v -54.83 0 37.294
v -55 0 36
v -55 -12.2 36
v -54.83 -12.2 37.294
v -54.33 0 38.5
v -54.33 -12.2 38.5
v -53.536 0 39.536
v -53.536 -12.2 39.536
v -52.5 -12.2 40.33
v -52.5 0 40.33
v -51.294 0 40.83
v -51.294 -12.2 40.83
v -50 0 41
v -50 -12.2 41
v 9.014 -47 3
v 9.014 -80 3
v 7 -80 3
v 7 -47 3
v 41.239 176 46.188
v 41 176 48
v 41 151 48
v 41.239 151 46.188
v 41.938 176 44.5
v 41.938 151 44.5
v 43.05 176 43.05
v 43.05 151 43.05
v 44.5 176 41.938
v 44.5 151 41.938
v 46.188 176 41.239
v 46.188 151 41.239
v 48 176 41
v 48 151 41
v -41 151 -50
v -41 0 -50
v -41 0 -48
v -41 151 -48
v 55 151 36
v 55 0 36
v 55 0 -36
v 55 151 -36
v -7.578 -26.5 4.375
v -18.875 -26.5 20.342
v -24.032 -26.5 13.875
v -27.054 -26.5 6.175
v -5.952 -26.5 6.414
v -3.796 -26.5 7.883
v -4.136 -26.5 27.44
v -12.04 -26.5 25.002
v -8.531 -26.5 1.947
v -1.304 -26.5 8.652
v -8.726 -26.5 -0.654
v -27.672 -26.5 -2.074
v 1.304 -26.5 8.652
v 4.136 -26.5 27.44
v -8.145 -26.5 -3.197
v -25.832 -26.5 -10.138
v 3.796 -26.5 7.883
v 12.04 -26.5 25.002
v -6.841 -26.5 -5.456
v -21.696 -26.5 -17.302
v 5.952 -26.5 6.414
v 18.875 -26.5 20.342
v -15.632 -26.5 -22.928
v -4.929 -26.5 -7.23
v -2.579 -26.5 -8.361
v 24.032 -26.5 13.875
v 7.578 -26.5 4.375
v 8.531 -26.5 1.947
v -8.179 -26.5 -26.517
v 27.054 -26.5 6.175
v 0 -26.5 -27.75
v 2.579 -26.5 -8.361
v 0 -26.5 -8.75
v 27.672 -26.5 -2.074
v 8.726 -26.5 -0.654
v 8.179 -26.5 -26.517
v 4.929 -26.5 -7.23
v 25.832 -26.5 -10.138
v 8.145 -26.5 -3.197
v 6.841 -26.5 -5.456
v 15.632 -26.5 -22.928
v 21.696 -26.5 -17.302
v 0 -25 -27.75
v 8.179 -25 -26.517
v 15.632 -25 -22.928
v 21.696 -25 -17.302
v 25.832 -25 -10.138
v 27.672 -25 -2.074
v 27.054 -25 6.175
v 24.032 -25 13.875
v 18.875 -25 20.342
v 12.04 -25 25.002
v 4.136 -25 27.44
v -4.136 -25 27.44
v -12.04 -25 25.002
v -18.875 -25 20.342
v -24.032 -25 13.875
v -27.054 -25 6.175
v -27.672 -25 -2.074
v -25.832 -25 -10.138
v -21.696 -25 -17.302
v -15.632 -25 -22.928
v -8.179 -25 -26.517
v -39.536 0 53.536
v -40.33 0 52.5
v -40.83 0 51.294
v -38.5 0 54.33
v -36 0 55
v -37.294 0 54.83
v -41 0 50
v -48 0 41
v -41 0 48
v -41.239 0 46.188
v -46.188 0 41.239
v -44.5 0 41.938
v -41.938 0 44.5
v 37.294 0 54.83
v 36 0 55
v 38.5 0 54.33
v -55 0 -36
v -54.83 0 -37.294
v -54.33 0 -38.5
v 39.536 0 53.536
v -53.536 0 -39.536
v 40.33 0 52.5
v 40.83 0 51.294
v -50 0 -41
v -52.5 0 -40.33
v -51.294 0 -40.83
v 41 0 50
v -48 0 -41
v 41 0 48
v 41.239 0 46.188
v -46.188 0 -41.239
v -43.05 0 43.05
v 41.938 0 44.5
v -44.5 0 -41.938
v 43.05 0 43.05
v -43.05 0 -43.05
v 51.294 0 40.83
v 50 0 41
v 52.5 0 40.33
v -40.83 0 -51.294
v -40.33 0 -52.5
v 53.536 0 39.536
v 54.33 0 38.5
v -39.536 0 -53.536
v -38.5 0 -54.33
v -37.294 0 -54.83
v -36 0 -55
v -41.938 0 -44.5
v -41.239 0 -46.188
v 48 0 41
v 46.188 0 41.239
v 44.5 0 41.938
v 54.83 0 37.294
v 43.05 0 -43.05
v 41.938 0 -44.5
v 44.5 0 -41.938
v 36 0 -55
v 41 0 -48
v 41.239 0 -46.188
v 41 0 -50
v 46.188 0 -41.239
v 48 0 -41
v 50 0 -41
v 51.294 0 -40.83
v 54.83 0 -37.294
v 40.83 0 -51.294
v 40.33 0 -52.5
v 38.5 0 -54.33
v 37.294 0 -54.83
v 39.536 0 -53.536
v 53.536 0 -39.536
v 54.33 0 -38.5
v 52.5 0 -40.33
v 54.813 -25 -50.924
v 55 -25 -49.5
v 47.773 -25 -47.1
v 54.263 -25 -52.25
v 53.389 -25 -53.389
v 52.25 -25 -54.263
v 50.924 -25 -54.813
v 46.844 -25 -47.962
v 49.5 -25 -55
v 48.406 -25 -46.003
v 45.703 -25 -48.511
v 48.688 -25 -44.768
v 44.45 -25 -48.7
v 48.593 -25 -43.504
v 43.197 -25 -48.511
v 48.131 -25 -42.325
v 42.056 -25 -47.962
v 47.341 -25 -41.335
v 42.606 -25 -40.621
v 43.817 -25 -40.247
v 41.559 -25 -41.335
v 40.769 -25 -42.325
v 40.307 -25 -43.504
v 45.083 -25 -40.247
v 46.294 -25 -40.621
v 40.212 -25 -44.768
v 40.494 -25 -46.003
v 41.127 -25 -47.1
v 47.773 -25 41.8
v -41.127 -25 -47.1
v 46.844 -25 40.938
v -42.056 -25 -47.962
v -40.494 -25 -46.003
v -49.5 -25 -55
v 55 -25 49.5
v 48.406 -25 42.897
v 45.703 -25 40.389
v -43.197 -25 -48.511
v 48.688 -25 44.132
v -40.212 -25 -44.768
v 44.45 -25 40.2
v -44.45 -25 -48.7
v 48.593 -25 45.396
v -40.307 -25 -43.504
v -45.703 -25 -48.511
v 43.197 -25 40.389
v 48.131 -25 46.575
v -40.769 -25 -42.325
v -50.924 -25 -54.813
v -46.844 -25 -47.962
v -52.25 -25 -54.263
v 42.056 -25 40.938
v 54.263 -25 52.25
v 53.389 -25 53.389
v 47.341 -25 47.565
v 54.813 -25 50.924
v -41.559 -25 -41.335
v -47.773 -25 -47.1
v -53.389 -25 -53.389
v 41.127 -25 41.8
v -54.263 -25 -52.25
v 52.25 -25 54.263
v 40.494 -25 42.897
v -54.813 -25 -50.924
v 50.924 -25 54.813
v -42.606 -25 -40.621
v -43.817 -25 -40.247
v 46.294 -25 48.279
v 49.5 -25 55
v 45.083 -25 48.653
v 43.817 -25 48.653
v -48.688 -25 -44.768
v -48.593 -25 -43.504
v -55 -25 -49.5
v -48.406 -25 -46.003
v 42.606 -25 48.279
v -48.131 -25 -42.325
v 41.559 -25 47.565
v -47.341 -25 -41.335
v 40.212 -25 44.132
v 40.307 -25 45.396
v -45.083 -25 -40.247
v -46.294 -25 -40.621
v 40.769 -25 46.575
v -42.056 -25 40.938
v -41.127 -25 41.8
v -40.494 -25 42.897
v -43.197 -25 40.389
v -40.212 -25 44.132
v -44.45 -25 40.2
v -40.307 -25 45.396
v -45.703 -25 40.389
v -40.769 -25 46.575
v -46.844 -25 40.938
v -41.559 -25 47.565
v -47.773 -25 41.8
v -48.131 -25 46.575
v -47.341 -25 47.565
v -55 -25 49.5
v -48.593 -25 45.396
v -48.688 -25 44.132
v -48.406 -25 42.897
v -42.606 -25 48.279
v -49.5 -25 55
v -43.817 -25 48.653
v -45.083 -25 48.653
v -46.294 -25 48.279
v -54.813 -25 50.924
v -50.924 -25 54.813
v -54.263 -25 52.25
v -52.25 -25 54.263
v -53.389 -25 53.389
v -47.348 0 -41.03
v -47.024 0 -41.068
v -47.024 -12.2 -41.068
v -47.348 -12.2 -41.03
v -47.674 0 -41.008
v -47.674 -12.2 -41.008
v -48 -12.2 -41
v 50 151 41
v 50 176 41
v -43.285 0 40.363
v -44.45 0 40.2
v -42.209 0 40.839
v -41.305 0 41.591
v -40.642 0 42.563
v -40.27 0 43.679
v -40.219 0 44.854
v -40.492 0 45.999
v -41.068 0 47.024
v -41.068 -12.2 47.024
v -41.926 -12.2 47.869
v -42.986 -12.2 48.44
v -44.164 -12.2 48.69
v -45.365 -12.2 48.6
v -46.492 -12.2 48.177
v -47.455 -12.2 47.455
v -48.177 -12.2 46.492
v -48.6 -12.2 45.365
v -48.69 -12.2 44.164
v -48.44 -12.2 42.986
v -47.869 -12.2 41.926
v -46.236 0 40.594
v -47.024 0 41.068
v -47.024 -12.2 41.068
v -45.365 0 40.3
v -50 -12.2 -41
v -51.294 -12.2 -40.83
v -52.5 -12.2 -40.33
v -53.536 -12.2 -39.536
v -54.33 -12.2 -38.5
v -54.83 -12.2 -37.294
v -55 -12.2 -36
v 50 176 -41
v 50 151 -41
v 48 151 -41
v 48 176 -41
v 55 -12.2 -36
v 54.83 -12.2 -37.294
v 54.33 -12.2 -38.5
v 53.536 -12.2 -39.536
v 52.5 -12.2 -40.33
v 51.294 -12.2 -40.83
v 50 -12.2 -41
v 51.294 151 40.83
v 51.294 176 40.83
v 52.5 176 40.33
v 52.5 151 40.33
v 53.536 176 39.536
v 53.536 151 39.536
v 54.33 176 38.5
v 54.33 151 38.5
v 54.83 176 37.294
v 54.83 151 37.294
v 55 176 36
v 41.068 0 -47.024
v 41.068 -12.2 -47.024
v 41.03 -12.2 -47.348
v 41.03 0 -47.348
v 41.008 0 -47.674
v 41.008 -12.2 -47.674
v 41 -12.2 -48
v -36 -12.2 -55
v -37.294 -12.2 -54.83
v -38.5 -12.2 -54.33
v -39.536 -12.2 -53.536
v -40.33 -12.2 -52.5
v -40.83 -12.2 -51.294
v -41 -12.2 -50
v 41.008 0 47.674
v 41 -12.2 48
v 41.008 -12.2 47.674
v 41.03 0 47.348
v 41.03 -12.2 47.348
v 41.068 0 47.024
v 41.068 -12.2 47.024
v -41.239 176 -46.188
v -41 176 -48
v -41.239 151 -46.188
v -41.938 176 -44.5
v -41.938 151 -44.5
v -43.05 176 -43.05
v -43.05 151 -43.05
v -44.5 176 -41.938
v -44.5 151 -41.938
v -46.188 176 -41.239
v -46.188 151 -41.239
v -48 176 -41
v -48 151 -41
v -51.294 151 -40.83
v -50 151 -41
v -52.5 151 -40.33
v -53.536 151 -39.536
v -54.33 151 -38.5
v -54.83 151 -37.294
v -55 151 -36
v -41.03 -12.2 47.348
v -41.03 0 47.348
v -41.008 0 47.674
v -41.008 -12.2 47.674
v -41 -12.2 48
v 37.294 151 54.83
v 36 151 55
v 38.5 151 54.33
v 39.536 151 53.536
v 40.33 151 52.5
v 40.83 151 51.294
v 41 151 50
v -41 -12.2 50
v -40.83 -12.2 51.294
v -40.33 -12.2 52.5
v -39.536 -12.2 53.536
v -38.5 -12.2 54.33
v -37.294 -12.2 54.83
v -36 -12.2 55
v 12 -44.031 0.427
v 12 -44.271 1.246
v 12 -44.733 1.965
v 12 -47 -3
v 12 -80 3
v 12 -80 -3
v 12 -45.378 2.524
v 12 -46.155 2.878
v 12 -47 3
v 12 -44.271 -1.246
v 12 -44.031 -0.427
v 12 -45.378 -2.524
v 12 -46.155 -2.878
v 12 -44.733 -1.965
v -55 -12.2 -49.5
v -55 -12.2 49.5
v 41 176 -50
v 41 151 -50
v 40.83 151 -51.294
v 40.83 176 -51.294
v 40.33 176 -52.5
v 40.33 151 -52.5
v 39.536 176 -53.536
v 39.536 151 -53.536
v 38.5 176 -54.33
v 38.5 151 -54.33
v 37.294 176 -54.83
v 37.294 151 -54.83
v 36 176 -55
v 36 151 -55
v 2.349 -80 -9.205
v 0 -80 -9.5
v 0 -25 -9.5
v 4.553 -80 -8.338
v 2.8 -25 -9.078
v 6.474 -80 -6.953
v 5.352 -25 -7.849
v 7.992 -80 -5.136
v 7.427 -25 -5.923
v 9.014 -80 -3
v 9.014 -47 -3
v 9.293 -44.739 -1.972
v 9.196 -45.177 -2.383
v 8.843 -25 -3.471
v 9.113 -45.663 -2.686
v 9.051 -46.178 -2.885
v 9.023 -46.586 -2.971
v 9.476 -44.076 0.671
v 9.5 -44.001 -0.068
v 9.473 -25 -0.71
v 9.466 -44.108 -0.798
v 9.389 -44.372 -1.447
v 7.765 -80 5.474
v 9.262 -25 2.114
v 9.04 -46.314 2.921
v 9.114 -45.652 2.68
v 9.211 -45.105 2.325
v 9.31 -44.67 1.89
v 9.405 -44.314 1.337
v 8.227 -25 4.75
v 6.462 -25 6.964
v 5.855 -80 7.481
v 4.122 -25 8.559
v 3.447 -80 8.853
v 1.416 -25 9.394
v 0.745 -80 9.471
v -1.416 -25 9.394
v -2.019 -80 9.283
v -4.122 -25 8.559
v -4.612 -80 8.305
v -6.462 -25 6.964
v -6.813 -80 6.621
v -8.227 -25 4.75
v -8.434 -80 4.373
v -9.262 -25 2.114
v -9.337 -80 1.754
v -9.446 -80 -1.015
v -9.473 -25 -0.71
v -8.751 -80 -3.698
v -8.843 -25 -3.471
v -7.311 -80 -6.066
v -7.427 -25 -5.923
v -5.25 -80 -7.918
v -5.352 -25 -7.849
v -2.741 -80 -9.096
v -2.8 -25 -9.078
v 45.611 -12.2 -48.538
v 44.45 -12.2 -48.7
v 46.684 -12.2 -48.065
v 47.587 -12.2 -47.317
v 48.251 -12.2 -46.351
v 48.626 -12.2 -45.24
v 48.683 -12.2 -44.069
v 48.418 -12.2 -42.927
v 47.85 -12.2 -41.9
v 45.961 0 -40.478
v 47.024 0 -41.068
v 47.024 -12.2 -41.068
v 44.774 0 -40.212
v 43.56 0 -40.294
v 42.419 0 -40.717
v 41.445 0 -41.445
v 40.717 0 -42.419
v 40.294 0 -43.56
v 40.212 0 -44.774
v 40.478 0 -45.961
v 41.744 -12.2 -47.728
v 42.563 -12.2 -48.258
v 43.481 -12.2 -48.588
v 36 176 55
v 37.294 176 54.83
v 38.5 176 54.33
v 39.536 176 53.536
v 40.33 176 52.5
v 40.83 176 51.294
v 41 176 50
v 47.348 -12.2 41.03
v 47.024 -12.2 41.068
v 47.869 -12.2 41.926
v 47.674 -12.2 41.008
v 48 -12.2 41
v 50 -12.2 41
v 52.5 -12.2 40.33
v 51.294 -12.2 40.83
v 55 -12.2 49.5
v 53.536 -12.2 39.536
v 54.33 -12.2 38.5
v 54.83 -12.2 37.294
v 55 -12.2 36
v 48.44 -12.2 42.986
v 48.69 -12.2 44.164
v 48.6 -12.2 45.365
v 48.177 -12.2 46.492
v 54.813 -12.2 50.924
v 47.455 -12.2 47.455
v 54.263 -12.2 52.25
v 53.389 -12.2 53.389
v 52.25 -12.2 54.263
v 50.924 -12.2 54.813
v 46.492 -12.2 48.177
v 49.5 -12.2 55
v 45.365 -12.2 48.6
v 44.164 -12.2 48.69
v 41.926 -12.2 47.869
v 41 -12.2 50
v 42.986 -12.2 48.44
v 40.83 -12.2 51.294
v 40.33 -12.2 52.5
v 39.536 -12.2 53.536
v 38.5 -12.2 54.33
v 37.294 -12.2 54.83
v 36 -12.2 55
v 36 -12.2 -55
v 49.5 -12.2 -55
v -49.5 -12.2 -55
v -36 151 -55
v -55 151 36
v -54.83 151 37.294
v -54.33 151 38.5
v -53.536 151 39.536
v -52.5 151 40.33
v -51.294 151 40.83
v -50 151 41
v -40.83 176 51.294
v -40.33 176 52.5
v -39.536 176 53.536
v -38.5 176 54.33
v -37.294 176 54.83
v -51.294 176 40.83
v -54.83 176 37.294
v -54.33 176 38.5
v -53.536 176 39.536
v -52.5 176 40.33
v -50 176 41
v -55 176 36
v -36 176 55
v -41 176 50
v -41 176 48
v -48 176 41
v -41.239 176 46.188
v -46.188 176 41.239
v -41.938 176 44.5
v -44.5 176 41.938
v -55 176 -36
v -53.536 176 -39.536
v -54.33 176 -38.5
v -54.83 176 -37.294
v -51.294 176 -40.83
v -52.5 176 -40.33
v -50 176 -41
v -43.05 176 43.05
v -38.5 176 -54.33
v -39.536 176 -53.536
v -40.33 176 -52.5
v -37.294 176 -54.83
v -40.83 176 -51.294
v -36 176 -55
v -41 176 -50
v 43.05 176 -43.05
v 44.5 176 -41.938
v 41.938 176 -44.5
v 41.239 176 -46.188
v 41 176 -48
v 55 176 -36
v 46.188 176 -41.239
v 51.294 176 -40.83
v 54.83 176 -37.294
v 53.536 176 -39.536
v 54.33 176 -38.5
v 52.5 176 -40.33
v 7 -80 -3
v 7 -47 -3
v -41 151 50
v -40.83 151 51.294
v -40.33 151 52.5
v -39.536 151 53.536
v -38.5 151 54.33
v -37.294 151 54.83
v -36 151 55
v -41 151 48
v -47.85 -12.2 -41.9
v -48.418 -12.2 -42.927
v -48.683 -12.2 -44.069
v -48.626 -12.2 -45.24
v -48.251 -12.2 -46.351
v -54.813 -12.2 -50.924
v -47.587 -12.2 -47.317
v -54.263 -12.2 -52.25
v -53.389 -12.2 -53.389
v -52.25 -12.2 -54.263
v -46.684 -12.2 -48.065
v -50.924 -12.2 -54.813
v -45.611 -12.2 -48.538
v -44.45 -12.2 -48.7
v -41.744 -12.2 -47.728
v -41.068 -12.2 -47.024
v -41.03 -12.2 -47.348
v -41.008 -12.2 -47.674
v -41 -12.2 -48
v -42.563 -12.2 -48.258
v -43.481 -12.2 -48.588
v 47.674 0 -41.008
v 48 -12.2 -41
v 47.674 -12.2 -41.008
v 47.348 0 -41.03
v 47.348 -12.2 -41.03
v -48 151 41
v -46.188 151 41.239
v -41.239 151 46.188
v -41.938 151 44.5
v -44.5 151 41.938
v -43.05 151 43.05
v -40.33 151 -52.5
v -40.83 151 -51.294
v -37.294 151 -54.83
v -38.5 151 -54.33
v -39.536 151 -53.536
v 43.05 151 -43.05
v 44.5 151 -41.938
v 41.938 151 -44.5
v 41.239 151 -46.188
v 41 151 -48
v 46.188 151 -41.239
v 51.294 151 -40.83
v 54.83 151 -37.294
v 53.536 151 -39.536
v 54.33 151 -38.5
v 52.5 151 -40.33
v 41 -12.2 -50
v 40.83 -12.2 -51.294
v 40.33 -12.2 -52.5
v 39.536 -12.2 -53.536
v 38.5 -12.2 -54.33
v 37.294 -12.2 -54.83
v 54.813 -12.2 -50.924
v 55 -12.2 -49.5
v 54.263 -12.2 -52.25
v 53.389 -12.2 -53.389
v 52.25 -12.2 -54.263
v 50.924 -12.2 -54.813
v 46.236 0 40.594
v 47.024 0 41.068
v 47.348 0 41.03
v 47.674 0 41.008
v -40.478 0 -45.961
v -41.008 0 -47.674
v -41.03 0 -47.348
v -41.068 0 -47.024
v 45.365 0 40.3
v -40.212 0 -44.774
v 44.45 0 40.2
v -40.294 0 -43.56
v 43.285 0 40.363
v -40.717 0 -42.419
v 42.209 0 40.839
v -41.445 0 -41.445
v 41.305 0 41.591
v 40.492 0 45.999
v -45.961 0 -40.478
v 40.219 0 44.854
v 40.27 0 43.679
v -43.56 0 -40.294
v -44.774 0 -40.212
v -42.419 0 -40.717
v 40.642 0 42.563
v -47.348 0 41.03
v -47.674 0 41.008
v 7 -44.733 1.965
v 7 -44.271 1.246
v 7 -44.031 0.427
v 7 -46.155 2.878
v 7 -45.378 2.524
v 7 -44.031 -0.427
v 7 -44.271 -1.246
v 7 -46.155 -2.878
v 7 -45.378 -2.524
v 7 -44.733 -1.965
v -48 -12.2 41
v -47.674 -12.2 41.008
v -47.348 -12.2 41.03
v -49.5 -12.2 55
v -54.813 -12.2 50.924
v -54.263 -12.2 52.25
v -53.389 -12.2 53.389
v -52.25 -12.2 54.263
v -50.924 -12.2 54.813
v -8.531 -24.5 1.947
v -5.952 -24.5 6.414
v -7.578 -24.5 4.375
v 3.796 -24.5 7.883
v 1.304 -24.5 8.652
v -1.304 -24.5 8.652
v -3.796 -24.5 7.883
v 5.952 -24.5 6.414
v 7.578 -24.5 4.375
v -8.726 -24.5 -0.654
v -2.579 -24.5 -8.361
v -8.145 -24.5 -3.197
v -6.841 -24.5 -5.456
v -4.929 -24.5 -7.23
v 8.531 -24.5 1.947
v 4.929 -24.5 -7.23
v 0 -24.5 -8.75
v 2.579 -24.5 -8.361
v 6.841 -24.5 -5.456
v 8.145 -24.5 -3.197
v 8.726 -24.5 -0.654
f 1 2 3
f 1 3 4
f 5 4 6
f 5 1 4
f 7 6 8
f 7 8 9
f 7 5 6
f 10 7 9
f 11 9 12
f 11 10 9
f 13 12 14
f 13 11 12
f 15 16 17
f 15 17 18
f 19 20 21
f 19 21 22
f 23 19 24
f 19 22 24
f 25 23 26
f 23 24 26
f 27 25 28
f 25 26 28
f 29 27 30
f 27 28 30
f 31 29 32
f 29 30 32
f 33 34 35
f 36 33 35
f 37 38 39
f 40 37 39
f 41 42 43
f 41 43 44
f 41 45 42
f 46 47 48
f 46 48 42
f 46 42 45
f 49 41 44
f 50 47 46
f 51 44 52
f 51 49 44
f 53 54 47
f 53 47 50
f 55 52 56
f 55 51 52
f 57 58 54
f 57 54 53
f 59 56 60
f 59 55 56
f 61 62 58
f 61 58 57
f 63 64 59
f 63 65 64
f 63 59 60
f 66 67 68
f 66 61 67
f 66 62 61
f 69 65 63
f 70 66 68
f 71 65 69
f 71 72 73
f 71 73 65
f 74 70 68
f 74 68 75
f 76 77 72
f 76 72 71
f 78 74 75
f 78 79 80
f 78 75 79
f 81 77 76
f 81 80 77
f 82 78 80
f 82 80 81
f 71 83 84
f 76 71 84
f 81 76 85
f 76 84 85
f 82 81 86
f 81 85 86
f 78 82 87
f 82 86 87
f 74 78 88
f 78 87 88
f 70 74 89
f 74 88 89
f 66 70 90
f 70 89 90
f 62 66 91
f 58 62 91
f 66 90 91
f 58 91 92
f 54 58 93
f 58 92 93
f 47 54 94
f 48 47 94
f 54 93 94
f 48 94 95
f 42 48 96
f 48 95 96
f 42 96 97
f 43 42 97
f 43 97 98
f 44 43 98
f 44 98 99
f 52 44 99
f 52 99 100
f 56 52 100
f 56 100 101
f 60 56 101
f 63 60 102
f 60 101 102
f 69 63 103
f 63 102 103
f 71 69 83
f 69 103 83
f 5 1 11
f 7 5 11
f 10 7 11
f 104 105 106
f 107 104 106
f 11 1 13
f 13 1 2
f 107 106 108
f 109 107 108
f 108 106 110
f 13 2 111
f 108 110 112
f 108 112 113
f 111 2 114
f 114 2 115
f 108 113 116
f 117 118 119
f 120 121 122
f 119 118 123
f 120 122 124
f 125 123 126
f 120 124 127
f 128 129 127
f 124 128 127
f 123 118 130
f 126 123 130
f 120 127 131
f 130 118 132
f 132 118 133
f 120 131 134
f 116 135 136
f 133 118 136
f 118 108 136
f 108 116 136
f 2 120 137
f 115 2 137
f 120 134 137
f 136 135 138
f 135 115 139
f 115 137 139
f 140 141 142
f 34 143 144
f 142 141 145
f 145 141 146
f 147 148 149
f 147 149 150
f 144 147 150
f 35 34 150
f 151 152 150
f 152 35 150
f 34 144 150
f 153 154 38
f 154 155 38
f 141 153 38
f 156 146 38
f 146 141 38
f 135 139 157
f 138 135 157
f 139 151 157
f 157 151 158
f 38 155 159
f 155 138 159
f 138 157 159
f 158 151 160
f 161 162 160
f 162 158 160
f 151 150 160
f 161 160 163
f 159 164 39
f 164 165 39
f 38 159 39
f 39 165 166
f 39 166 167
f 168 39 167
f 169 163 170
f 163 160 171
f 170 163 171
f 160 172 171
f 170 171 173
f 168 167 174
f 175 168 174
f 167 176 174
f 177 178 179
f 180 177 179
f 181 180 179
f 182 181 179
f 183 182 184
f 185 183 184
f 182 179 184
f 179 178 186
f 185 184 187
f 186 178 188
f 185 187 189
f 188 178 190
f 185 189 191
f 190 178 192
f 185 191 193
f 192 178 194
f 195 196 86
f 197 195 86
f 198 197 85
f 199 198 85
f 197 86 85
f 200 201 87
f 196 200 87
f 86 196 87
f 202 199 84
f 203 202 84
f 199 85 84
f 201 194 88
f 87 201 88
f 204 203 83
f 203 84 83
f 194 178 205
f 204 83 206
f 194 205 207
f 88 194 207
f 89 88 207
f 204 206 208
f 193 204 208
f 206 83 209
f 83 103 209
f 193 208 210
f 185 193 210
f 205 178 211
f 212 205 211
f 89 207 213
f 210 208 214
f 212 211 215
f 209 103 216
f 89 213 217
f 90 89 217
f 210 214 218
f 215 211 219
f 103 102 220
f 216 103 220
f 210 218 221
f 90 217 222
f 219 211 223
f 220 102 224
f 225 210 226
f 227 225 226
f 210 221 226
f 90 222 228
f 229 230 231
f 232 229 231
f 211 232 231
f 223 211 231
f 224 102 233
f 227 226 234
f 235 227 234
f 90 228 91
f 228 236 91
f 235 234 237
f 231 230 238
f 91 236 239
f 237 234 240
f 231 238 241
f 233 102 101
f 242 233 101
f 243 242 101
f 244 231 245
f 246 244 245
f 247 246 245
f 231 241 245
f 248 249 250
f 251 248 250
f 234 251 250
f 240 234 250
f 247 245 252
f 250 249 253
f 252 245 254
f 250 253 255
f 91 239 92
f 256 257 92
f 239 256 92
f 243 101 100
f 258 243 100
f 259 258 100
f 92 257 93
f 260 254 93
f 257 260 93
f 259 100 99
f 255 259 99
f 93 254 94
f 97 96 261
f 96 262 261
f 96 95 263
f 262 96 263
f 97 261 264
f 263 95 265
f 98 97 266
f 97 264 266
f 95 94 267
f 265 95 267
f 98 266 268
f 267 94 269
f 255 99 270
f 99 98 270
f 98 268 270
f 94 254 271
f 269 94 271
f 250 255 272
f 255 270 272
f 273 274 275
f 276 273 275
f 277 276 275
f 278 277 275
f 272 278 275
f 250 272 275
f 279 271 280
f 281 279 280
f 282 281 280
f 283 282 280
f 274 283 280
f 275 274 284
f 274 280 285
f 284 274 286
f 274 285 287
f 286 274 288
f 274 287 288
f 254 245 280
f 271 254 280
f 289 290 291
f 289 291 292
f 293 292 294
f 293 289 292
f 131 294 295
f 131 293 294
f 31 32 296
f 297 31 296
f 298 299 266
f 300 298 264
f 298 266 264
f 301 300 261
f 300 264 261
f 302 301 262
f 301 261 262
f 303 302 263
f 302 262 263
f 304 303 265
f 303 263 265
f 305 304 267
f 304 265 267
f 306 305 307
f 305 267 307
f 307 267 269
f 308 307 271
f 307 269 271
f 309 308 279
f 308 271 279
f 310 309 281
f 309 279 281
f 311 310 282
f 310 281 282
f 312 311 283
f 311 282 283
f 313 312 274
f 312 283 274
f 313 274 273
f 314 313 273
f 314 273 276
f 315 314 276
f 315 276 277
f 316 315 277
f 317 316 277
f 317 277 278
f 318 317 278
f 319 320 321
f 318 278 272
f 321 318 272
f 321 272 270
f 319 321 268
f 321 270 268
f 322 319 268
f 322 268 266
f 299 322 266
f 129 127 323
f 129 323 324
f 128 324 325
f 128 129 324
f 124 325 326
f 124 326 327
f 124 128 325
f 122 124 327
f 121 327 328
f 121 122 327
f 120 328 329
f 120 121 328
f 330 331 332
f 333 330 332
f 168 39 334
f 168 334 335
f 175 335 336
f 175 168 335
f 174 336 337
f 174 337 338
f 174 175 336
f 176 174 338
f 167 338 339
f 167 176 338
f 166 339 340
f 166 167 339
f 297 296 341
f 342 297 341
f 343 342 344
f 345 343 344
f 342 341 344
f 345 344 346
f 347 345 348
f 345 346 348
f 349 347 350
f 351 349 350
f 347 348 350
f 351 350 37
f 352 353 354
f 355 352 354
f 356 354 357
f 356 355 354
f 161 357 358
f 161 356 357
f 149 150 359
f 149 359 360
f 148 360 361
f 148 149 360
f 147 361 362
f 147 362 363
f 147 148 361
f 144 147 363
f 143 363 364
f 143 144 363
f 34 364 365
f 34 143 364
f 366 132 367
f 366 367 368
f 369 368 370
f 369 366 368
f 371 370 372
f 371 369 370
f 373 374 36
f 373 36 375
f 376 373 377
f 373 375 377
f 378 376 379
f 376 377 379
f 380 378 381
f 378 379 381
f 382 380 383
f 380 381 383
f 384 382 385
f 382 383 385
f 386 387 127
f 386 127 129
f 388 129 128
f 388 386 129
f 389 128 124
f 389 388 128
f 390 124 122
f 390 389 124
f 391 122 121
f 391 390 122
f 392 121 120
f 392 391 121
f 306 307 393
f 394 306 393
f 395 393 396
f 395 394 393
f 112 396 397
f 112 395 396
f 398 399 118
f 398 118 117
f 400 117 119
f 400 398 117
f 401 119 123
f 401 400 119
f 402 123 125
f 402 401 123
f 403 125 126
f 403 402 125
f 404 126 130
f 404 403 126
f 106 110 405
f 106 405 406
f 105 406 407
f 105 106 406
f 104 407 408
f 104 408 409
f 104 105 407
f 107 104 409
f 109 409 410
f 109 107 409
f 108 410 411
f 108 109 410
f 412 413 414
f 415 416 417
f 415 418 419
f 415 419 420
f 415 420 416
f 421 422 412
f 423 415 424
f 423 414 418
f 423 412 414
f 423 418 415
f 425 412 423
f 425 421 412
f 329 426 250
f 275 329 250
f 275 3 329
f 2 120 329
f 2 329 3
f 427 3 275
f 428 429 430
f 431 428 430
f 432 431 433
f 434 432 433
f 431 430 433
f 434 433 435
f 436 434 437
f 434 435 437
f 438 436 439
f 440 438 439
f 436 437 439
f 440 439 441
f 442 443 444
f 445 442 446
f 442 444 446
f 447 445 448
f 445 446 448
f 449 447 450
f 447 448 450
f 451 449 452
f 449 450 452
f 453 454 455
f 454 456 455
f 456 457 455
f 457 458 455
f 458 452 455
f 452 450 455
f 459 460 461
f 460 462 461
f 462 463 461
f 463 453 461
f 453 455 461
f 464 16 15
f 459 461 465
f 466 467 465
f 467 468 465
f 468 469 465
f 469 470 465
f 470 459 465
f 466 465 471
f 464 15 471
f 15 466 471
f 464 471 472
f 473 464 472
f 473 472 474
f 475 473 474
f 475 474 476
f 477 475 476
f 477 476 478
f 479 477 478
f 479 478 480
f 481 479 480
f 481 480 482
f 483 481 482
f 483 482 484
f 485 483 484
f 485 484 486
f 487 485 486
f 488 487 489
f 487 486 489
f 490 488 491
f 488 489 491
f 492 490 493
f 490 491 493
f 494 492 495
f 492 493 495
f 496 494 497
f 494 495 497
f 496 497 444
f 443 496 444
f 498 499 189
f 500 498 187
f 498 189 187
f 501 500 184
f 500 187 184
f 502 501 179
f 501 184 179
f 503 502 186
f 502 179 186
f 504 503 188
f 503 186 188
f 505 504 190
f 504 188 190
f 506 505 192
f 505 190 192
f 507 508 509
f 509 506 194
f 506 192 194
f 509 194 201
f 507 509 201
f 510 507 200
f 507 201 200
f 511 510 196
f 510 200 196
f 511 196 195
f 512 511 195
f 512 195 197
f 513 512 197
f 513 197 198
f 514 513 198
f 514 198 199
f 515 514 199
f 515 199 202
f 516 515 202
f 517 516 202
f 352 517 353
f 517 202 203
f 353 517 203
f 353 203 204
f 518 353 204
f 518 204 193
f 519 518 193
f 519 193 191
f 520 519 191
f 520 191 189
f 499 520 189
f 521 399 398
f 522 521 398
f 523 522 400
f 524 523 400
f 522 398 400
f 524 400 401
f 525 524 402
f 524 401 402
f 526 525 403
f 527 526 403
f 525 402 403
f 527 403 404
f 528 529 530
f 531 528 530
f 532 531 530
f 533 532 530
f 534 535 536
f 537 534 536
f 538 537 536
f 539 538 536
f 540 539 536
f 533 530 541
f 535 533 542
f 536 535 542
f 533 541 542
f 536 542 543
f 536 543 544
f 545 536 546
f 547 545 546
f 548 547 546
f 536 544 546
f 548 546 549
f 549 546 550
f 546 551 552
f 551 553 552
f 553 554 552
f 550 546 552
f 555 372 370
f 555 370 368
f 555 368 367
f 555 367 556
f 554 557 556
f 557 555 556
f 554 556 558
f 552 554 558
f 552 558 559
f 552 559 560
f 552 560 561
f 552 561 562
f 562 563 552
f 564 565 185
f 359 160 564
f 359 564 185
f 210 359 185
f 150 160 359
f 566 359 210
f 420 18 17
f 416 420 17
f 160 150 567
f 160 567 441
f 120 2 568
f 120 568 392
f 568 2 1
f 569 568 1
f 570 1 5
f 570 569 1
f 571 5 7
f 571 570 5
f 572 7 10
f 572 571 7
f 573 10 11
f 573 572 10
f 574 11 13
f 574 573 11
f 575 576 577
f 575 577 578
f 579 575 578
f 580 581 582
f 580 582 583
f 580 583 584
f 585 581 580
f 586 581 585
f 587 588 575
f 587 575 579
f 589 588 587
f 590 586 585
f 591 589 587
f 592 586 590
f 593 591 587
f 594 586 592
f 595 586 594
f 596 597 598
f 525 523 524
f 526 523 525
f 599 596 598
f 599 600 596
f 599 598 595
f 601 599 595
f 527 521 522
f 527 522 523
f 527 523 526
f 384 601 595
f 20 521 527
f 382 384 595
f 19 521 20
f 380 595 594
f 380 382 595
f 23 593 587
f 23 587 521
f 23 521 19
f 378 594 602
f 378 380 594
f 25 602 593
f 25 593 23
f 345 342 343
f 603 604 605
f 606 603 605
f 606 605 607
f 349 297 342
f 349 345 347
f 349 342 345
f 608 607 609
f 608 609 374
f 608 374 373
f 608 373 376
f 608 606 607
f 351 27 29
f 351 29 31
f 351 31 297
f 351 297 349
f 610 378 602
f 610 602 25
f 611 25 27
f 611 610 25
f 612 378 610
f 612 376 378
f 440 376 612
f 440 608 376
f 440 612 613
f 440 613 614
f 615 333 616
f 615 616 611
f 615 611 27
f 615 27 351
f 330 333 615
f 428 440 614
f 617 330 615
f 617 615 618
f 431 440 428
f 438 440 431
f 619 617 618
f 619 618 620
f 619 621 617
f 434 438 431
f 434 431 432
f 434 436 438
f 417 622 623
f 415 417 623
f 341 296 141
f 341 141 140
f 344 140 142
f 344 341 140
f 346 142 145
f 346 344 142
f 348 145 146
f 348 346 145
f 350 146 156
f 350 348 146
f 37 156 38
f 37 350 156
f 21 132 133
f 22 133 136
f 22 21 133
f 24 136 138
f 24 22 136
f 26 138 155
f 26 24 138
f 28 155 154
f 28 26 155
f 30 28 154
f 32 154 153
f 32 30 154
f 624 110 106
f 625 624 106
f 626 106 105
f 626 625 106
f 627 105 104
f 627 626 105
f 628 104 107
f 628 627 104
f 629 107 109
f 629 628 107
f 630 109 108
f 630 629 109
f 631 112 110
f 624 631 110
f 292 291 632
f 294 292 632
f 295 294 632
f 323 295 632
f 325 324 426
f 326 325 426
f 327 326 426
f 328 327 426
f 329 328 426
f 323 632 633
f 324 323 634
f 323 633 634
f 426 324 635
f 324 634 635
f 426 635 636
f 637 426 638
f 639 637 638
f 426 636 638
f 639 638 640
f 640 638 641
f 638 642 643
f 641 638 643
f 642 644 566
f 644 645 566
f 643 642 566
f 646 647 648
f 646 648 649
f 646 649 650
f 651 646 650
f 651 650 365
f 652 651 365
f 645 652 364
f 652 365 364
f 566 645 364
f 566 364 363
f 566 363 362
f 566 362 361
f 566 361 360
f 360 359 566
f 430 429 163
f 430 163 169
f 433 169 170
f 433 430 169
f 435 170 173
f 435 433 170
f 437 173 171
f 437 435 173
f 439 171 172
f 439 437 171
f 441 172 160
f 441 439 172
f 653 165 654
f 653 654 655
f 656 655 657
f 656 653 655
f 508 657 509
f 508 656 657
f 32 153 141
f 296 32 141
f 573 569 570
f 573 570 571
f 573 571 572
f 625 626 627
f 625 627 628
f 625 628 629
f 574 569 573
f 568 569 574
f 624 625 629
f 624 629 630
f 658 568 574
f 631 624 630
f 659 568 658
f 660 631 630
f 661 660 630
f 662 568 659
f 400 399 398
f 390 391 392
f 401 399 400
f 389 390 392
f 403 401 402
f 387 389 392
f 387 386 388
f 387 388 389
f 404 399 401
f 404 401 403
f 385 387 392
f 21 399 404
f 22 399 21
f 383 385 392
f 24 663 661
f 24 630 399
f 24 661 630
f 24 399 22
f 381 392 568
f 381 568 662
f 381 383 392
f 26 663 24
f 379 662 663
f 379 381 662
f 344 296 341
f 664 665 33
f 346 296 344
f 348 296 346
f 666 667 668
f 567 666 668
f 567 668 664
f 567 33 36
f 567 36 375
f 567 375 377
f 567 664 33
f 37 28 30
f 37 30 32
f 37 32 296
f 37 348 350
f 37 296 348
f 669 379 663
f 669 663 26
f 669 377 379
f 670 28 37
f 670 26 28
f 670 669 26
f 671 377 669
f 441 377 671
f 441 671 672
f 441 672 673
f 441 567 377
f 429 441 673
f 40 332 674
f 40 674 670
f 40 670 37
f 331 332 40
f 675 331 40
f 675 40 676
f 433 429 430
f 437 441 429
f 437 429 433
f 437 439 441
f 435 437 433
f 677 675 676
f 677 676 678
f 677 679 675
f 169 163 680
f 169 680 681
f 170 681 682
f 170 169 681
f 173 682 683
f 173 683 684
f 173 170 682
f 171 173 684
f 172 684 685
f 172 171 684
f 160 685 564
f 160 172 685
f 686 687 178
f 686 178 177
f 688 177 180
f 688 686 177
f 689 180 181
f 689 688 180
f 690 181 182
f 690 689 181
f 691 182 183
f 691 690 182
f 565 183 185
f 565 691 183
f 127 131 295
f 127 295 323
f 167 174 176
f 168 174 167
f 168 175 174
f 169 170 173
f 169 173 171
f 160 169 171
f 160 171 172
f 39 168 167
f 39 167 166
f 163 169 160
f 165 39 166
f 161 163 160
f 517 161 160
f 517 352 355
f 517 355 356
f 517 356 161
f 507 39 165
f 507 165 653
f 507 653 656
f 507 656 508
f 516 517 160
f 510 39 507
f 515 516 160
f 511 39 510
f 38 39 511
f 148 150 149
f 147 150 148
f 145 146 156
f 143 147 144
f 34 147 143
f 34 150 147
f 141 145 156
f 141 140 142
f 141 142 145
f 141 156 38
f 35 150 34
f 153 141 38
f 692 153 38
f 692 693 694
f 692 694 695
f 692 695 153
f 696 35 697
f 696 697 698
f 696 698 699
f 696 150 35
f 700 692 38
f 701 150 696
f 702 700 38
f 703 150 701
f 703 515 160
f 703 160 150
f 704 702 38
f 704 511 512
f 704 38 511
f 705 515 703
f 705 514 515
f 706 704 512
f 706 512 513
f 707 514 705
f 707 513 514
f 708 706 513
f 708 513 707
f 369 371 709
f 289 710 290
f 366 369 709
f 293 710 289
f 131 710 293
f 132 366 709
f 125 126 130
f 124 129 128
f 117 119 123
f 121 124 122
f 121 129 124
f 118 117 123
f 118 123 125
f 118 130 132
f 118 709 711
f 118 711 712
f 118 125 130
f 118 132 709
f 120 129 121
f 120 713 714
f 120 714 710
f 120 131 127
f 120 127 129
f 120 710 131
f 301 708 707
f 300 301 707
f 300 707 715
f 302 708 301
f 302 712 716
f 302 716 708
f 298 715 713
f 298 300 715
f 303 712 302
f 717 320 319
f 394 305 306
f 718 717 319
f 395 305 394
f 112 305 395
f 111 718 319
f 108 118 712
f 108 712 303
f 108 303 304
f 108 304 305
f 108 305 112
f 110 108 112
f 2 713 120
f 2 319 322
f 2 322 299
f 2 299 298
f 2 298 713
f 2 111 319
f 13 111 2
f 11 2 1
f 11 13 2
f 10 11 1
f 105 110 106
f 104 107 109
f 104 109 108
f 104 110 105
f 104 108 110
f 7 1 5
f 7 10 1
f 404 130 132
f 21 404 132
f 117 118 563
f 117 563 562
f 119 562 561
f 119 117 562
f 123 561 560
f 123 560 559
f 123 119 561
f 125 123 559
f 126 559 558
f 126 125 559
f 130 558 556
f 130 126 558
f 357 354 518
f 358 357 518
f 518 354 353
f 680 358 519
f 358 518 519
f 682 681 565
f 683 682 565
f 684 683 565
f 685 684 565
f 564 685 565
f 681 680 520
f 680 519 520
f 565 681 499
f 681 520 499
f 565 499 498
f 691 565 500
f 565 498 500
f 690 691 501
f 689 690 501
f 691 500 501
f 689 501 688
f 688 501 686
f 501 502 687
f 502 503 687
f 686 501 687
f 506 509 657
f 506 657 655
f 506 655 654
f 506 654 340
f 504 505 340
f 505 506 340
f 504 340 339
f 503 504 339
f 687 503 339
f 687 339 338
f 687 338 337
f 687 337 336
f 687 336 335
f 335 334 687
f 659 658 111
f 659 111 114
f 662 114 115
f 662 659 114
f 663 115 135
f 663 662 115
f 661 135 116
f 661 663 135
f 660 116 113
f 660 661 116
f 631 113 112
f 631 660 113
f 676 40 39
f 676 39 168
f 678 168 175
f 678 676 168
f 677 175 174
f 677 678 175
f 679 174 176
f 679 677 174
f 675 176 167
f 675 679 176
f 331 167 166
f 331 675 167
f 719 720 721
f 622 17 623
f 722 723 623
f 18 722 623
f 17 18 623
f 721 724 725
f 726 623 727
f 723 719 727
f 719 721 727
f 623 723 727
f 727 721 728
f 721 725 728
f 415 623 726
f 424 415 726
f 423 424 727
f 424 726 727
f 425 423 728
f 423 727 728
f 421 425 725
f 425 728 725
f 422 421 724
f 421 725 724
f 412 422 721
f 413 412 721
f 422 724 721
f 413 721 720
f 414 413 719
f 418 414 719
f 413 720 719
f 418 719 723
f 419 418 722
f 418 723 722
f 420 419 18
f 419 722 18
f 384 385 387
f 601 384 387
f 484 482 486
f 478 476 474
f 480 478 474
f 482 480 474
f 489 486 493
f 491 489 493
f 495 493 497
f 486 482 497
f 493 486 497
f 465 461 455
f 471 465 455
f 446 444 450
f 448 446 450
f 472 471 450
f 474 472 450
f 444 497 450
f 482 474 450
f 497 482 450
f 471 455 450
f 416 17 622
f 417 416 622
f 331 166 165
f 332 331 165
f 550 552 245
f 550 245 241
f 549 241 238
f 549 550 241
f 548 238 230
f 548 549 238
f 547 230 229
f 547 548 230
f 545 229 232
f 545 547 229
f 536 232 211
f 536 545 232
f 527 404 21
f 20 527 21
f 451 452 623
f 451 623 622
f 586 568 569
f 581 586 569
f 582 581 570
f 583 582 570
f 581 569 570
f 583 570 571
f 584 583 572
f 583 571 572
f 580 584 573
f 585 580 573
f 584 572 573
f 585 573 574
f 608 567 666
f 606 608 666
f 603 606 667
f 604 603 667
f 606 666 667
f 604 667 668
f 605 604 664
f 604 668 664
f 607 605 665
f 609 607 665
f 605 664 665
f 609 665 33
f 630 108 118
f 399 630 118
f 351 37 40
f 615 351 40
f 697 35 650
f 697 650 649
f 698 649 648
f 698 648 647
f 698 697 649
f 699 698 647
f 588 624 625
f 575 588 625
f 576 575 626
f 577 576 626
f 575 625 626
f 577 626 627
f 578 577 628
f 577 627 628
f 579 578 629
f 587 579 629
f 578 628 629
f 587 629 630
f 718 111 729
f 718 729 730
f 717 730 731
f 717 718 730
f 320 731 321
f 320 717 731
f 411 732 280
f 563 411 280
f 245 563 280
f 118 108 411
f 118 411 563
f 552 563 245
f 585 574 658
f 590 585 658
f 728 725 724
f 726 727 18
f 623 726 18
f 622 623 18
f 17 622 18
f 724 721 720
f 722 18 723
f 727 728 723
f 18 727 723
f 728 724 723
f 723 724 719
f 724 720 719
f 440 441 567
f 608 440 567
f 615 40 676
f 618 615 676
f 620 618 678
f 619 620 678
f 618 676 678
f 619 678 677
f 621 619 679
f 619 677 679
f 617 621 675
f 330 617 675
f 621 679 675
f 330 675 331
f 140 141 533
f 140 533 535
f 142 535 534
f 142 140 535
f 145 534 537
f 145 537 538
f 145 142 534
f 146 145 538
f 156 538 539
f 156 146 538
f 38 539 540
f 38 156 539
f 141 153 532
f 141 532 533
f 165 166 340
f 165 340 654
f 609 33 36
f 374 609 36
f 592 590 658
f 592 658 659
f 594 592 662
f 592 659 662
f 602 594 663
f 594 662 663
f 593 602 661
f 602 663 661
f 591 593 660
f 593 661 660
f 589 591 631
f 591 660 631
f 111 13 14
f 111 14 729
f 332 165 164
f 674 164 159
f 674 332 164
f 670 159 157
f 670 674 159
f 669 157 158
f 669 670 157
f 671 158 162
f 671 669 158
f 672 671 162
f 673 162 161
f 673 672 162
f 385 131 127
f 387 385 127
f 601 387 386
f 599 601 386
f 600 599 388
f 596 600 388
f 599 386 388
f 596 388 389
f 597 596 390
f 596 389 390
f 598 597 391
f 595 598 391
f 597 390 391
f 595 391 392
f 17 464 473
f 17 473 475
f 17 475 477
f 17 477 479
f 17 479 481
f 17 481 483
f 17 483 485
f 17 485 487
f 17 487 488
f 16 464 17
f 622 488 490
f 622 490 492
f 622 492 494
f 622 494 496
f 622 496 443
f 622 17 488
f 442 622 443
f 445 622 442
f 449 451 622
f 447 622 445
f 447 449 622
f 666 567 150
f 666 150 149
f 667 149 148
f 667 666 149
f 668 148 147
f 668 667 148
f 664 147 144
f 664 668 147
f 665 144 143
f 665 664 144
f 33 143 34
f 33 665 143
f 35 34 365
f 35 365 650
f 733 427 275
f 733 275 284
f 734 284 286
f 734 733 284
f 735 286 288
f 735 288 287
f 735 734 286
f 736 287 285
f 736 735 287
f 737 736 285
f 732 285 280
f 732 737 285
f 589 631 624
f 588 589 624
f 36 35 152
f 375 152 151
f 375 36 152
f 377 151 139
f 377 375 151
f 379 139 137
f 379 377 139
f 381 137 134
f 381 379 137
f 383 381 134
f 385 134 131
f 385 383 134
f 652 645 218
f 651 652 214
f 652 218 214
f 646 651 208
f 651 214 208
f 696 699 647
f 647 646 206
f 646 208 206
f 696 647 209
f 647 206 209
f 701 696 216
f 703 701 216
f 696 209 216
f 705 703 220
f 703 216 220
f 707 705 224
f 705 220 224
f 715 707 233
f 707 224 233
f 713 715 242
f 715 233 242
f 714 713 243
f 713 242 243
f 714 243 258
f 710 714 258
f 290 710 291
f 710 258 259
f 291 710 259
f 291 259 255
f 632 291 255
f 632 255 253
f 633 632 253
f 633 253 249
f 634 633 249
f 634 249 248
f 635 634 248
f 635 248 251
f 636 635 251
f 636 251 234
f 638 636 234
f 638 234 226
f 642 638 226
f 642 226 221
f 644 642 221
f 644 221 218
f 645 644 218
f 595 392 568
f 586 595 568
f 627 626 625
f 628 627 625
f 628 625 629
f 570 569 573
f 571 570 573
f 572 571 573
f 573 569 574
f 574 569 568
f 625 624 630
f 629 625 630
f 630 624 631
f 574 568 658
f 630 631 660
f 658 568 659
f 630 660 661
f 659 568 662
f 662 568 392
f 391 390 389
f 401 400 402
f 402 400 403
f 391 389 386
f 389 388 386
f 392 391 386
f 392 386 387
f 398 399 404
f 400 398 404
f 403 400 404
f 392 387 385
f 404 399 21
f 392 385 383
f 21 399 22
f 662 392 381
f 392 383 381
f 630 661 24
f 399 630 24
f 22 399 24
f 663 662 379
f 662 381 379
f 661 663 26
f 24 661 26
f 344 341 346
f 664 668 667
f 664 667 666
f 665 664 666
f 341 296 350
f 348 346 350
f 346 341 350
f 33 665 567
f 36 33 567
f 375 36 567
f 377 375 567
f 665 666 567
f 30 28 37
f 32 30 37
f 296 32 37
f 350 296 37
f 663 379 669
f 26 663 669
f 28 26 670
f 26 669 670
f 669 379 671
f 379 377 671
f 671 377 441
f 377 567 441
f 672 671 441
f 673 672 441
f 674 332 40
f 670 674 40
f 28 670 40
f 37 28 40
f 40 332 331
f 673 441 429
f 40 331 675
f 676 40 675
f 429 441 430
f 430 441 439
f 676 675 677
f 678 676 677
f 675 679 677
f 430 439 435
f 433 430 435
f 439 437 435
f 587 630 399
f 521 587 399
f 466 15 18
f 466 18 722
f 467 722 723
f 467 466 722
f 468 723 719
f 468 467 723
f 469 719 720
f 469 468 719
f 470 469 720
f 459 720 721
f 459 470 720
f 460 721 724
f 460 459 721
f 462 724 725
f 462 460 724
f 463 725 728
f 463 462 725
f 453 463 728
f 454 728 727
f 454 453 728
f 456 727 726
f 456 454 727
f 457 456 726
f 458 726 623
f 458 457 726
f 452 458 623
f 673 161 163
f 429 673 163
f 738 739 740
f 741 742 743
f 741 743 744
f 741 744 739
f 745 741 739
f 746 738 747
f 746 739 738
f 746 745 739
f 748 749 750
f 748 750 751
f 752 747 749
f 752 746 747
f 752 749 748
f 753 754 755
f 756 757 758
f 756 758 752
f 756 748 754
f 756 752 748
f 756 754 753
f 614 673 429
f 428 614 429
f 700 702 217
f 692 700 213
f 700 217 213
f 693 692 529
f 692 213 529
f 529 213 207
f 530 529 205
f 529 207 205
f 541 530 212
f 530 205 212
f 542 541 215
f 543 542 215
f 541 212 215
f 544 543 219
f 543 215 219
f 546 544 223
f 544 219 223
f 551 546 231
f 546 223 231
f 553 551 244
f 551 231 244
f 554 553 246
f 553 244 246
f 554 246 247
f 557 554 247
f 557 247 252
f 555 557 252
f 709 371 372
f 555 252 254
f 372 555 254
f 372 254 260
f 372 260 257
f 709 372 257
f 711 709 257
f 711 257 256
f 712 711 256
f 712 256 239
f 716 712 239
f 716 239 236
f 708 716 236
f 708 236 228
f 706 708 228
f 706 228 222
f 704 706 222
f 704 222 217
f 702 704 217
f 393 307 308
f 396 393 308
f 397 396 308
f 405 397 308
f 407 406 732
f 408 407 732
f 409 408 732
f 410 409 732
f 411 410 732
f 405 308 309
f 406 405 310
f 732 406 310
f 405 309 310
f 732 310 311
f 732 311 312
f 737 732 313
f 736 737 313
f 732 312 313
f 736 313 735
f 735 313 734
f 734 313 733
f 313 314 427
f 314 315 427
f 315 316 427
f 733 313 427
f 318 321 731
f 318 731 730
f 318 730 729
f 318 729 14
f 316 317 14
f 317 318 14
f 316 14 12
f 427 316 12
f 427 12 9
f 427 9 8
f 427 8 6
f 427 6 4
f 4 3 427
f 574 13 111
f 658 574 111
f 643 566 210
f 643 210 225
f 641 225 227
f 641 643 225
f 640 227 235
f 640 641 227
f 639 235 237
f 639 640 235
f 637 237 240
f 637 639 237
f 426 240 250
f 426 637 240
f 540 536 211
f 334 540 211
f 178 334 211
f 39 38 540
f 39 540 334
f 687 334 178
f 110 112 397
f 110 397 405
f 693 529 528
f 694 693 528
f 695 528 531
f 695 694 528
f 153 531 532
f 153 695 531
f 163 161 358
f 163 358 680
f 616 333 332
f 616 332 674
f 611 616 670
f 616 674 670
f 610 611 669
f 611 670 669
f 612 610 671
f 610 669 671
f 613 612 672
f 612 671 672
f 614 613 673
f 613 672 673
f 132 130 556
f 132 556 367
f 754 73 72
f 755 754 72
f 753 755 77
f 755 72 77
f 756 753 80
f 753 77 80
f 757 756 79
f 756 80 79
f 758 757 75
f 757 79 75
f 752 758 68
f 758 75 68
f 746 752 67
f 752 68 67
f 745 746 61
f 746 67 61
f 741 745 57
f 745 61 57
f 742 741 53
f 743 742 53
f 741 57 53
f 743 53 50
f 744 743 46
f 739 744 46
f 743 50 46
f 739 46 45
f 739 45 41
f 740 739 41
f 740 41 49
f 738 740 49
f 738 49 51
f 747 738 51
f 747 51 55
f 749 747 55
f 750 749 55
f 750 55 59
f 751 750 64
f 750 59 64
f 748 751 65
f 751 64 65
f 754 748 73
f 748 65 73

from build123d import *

# Parameters (mm, degrees)
SKETCH_1_W               = 110
SKETCH_1_H               = 110
EXTRUDE_1_DEPTH          = 151
CUT_EXTRUDE_1_DEPTH      = 152
PATTERN_CIRCULAR_1_COUNT = 4
EXTRUDE_2_DEPTH          = 25
EXTRUDE_4_DEPTH          = 25
CUT_EXTRUDE_2_DEPTH      = 12.2
PATTERN_CIRCULAR_2_COUNT = 4
SKETCH_9_R               = 27.75
EXTRUDE_5_DEPTH          = 1.5
SKETCH_15_R              = 8.75
CUT_EXTRUDE_7_DEPTH      = 2
SKETCH_11_R              = 9.5
EXTRUDE_6_DEPTH          = 55
SKETCH_12_R              = 4.25
CUT_EXTRUDE_3_DEPTH      = 202
CUT_EXTRUDE_8_DEPTH      = 2.5
EXTRUDE_7_DEPTH          = 5


with BuildPart() as part:
    # Sketch 1 → Extrude 1 (new body)
    with BuildSketch(Plane(origin=(0, 0, 0), x_dir=(1, 0, 0), z_dir=(0, 1, 0))):
        Rectangle(SKETCH_1_W, SKETCH_1_H)
    extrude(amount=EXTRUDE_1_DEPTH)

    # Sketch 3 → Cut-Extrude 1 (cut, through all)
    with BuildSketch(Plane(origin=(0, 151, 0), x_dir=(1, 0, 0), z_dir=(0, 1, 0))):
        with BuildLine():
            Line((-50, -41), (-48, -41))
            ThreePointArc((-48, -41), (-43.050252532, -43.050252532), (-41, -48))
            Line((-41, -48), (-41, -50))
            ThreePointArc((-41, -50), (-39.535533906, -53.535533906), (-36, -55))
            Line((-36, -55), (-55, -55))
            Line((-55, -55), (-55, -36))
            ThreePointArc((-55, -36), (-53.535533906, -39.535533906), (-50, -41))
        make_face()
    cut_extrude_1 = extrude(amount=-CUT_EXTRUDE_1_DEPTH, mode=Mode.SUBTRACT)

    # Pattern Circular 1: Cut-Extrude 1 ×4 about axis
    pattern_circular_1_axis = Axis((0, 0, 0), (0, 1, 0))
    for i in range(1, PATTERN_CIRCULAR_1_COUNT):
        add(cut_extrude_1.rotate(pattern_circular_1_axis, i * 360 / PATTERN_CIRCULAR_1_COUNT), mode=Mode.SUBTRACT)


with BuildPart() as body_2:
    # Sketch 4 → Extrude 2 (new body)
    with BuildSketch(Plane(origin=(0, 151, 0), x_dir=(1, 0, 0), z_dir=(0, 1, 0))):
        with BuildLine():
            Line((-55, 36), (-55, -36))
            ThreePointArc((-55, -36), (-53.535533906, -39.535533906), (-50, -41))
            Line((-50, -41), (-48, -41))
            ThreePointArc((-48, -41), (-43.050252532, -43.050252532), (-41, -48))
            Line((-41, -48), (-41, -50))
            ThreePointArc((-41, -50), (-39.535533906, -53.535533906), (-36, -55))
            Line((-36, -55), (36, -55))
            ThreePointArc((36, -55), (39.535533906, -53.535533906), (41, -50))
            Line((41, -50), (41, -48))
            ThreePointArc((41, -48), (43.050252532, -43.050252532), (48, -41))
            Line((48, -41), (50, -41))
            ThreePointArc((50, -41), (53.535533906, -39.535533906), (55, -36))
            Line((55, -36), (55, 36))
            ThreePointArc((55, 36), (53.535533906, 39.535533906), (50, 41))
            Line((50, 41), (48, 41))
            ThreePointArc((48, 41), (43.050252532, 43.050252532), (41, 48))
            Line((41, 48), (41, 50))
            ThreePointArc((41, 50), (39.535533906, 53.535533906), (36, 55))
            Line((36, 55), (-36, 55))
            ThreePointArc((-36, 55), (-39.535533906, 53.535533906), (-41, 50))
            Line((-41, 50), (-41, 48))
            ThreePointArc((-41, 48), (-43.050252532, 43.050252532), (-48, 41))
            Line((-48, 41), (-50, 41))
            ThreePointArc((-50, 41), (-53.535533906, 39.535533906), (-55, 36))
        make_face()
    extrude(amount=EXTRUDE_2_DEPTH)


with BuildPart() as body_3:
    # Sketch 6 → Extrude 4 (new body)
    with BuildSketch(Plane.XZ):
        with BuildLine():
            Line((-49.5, 55), (49.5, 55))
            ThreePointArc((49.5, 55), (53.389087297, 53.389087297), (55, 49.5))
            Line((55, 49.5), (55, -49.5))
            ThreePointArc((55, -49.5), (53.389087297, -53.389087297), (49.5, -55))
            Line((49.5, -55), (-49.5, -55))
            ThreePointArc((-49.5, -55), (-53.389087297, -53.389087297), (-55, -49.5))
            Line((-55, -49.5), (-55, 49.5))
            ThreePointArc((-55, 49.5), (-53.389087297, 53.389087297), (-49.5, 55))
        make_face()
    extrude(amount=EXTRUDE_4_DEPTH)

    # Sketch 8 → Cut-Extrude 2 (cut)
    with BuildSketch(Plane(origin=(0, 0, 0), x_dir=(1, 0, 0), z_dir=(0, 1, 0))):
        with BuildLine():
            Line((-50, -41), (-48, -41))
            ThreePointArc((-48, -41), (-43.050252532, -43.050252532), (-41, -48))
            Line((-41, -48), (-41, -50))
            ThreePointArc((-41, -50), (-39.535533906, -53.535533906), (-36, -55))
            Line((-36, -55), (-49.5, -55))
            ThreePointArc((-49.5, -55), (-53.389087297, -53.389087297), (-55, -49.5))
            Line((-55, -49.5), (-55, -36))
            ThreePointArc((-55, -36), (-53.535533906, -39.535533906), (-50, -41))
        make_face()
    cut_extrude_2 = extrude(amount=-CUT_EXTRUDE_2_DEPTH, mode=Mode.SUBTRACT)

    # Pattern Circular 2: Cut-Extrude 2 ×4 about axis
    pattern_circular_2_axis = Axis((0, 0, 0), (0, 1, 0))
    for i in range(1, PATTERN_CIRCULAR_2_COUNT):
        add(cut_extrude_2.rotate(pattern_circular_2_axis, i * 360 / PATTERN_CIRCULAR_2_COUNT), mode=Mode.SUBTRACT)

    # Sketch 9 → Extrude 5 (add)
    with BuildSketch(Plane.XZ.offset(25)):
        with Locations(Location((0, 0, 0), (0, 0, 270))):  # turned: the seam where the file's is
            Circle(SKETCH_9_R)
    extrude(amount=EXTRUDE_5_DEPTH)

    # Sketch 15 → Cut-Extrude 7 (cut)
    with BuildSketch(Plane.XZ.offset(26.5)):
        with Locations(Location((0, 0, 0), (0, 0, 270))):  # turned: the seam where the file's is
            Circle(SKETCH_15_R)
    extrude(amount=-CUT_EXTRUDE_7_DEPTH, mode=Mode.SUBTRACT)

    # Sketch 12 → Cut-Extrude 3 (cut, through all)
    with BuildSketch(Plane.XZ.offset(25)):
        with Locations(Location((-44.45, 44.45, 0), (0, 0, 270))):  # turned: the seam where the file's is
            Circle(SKETCH_12_R)
        with Locations(Location((44.45, 44.45, 0), (0, 0, 270))):  # turned: the seam where the file's is
            Circle(SKETCH_12_R)
        with Locations(Location((-44.45, -44.45, 0), (0, 0, 270))):  # turned: the seam where the file's is
            Circle(SKETCH_12_R)
        with Locations(Location((44.45, -44.45, 0), (0, 0, 270))):  # turned: the seam where the file's is
            Circle(SKETCH_12_R)
    extrude(amount=-CUT_EXTRUDE_3_DEPTH, mode=Mode.SUBTRACT)


with BuildPart() as body_4:
    # Sketch 11 → Extrude 6 (new body)
    with BuildSketch(Plane.XZ.offset(25)):
        with Locations(Location((0, 0, 0), (0, 0, 270))):  # turned: the seam where the file's is
            Circle(SKETCH_11_R)
    extrude(amount=EXTRUDE_6_DEPTH)

    # Sketch 16 → Cut-Extrude 8 (cut)
    with BuildSketch(Plane(origin=(9.5, 0, 0), x_dir=(0, 0, -1), z_dir=(1, 0, 0))):
        with BuildLine():
            Line((-3, -80), (-3, -47))
            ThreePointArc((-3, -47), (0, -44), (3, -47))
            Line((3, -47), (3, -80))
            Line((3, -80), (-3, -80))
        make_face()
    extrude(amount=-CUT_EXTRUDE_8_DEPTH, mode=Mode.SUBTRACT)


with BuildPart() as body_5:
    # Sketch 17 → Extrude 7 (new body)
    with BuildSketch(Plane(origin=(7, 0, 0), x_dir=(0, 0, -1), z_dir=(1, 0, 0))):
        with BuildLine():
            Line((-3, -80), (3, -80))
            Line((3, -80), (3, -47))
            ThreePointArc((3, -47), (0, -44), (-3, -47))
            Line((-3, -47), (-3, -80))
        make_face()
    extrude(amount=EXTRUDE_7_DEPTH)


solid = Compound([part.part, body_2.part, body_3.part, body_4.part, body_5.part])
